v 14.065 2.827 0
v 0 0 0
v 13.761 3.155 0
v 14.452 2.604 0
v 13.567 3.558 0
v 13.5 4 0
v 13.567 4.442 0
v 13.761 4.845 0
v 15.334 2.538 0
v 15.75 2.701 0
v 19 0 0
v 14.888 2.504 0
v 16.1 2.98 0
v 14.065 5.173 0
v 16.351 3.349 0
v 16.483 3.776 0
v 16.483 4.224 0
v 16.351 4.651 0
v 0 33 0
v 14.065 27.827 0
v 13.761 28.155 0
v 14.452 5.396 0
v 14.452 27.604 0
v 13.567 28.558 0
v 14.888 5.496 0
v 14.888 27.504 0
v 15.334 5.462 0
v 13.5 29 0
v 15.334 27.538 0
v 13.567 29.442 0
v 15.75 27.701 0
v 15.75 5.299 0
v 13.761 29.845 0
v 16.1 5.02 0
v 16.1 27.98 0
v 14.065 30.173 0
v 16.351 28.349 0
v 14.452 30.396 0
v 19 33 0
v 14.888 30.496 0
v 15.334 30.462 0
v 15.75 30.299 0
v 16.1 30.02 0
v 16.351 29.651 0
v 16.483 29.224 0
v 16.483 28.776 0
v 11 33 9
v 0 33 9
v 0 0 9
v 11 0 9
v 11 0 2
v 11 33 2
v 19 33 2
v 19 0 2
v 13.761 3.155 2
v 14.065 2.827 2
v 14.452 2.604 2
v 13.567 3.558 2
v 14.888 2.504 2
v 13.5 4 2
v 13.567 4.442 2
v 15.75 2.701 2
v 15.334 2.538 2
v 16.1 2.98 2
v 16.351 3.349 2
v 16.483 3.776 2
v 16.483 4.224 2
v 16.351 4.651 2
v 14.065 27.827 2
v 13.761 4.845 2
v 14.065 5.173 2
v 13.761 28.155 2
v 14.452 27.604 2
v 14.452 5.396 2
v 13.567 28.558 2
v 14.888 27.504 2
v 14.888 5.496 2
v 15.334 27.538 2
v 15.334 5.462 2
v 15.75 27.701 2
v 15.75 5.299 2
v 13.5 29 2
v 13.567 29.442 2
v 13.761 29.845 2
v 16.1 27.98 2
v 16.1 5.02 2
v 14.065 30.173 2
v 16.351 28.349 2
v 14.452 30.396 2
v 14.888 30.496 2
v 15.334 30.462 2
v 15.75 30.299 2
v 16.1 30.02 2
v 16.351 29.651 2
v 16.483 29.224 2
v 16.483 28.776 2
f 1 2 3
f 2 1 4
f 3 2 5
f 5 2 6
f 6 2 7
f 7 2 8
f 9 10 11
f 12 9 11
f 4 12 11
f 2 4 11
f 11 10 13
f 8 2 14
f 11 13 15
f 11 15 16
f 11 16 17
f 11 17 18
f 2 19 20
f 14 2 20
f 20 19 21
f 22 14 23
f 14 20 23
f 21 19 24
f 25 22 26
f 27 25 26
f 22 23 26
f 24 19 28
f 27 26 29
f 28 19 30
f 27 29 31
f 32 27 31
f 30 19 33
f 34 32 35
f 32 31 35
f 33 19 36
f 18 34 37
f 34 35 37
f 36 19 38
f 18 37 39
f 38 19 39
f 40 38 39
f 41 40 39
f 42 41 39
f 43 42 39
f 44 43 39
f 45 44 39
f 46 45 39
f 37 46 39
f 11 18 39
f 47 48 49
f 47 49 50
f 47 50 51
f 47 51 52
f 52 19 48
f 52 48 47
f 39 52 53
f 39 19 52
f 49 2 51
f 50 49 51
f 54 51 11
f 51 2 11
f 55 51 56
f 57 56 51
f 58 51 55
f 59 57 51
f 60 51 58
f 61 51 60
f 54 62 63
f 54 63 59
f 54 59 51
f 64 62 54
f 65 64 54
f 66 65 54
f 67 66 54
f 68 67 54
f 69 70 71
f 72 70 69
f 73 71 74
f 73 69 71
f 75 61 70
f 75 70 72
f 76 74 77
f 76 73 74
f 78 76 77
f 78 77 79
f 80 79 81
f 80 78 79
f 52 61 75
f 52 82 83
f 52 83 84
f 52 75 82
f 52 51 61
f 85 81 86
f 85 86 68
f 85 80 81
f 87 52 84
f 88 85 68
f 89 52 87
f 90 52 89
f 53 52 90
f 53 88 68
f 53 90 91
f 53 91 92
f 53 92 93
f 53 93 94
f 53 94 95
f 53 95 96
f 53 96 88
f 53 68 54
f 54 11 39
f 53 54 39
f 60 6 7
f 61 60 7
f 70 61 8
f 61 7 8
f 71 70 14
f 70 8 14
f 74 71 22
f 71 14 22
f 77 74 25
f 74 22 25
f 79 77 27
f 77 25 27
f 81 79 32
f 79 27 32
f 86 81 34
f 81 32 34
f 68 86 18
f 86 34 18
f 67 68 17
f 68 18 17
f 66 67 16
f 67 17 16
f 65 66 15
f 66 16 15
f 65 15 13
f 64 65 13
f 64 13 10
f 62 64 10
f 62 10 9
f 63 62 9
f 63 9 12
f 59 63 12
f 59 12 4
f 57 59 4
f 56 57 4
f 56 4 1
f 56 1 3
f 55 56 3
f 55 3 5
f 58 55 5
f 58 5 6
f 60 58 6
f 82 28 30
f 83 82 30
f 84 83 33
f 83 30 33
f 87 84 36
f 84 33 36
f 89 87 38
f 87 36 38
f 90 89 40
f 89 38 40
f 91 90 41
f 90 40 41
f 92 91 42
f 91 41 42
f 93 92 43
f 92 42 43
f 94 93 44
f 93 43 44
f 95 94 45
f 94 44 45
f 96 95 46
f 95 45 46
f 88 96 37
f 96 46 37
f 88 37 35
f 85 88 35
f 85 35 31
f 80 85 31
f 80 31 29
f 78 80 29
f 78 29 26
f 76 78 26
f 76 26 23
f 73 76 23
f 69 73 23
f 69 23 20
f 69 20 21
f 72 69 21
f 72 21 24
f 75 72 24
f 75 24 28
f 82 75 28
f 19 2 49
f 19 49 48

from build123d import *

# Parameters (mm, degrees)
SKETCH1_W                 = 19
SKETCH1_H                 = 33
BOSS_EXTRUDE1_DEPTH       = 9
SKETCH3_W                 = 8
SKETCH3_H                 = 33
CUT_EXTRUDE1_DEPTH        = 7
F_3_0MM_DOWEL_HOLE1_D     = 3
F_3_0MM_DOWEL_HOLE1_DEPTH = 2


with BuildPart() as part:
    # Sketch1 → Boss-Extrude1 (new body)
    with BuildSketch(Plane.XY):
        with Locations((9.5, 16.5)):
            Rectangle(SKETCH1_W, SKETCH1_H)
    extrude(amount=BOSS_EXTRUDE1_DEPTH)

    # Sketch3 → Cut-Extrude1 (cut)
    with BuildSketch(Plane.XY.offset(9)):
        with Locations((15, 16.5)):
            Rectangle(SKETCH3_W, SKETCH3_H)
    extrude(amount=-CUT_EXTRUDE1_DEPTH, mode=Mode.SUBTRACT)

    # Ø3.0mm Dowel Hole1
    with Locations(Plane.XY.offset(2)):
        with Locations((15, 4), (15, 29)):
            Hole(F_3_0MM_DOWEL_HOLE1_D / 2, depth=F_3_0MM_DOWEL_HOLE1_DEPTH)


solid = part.part
